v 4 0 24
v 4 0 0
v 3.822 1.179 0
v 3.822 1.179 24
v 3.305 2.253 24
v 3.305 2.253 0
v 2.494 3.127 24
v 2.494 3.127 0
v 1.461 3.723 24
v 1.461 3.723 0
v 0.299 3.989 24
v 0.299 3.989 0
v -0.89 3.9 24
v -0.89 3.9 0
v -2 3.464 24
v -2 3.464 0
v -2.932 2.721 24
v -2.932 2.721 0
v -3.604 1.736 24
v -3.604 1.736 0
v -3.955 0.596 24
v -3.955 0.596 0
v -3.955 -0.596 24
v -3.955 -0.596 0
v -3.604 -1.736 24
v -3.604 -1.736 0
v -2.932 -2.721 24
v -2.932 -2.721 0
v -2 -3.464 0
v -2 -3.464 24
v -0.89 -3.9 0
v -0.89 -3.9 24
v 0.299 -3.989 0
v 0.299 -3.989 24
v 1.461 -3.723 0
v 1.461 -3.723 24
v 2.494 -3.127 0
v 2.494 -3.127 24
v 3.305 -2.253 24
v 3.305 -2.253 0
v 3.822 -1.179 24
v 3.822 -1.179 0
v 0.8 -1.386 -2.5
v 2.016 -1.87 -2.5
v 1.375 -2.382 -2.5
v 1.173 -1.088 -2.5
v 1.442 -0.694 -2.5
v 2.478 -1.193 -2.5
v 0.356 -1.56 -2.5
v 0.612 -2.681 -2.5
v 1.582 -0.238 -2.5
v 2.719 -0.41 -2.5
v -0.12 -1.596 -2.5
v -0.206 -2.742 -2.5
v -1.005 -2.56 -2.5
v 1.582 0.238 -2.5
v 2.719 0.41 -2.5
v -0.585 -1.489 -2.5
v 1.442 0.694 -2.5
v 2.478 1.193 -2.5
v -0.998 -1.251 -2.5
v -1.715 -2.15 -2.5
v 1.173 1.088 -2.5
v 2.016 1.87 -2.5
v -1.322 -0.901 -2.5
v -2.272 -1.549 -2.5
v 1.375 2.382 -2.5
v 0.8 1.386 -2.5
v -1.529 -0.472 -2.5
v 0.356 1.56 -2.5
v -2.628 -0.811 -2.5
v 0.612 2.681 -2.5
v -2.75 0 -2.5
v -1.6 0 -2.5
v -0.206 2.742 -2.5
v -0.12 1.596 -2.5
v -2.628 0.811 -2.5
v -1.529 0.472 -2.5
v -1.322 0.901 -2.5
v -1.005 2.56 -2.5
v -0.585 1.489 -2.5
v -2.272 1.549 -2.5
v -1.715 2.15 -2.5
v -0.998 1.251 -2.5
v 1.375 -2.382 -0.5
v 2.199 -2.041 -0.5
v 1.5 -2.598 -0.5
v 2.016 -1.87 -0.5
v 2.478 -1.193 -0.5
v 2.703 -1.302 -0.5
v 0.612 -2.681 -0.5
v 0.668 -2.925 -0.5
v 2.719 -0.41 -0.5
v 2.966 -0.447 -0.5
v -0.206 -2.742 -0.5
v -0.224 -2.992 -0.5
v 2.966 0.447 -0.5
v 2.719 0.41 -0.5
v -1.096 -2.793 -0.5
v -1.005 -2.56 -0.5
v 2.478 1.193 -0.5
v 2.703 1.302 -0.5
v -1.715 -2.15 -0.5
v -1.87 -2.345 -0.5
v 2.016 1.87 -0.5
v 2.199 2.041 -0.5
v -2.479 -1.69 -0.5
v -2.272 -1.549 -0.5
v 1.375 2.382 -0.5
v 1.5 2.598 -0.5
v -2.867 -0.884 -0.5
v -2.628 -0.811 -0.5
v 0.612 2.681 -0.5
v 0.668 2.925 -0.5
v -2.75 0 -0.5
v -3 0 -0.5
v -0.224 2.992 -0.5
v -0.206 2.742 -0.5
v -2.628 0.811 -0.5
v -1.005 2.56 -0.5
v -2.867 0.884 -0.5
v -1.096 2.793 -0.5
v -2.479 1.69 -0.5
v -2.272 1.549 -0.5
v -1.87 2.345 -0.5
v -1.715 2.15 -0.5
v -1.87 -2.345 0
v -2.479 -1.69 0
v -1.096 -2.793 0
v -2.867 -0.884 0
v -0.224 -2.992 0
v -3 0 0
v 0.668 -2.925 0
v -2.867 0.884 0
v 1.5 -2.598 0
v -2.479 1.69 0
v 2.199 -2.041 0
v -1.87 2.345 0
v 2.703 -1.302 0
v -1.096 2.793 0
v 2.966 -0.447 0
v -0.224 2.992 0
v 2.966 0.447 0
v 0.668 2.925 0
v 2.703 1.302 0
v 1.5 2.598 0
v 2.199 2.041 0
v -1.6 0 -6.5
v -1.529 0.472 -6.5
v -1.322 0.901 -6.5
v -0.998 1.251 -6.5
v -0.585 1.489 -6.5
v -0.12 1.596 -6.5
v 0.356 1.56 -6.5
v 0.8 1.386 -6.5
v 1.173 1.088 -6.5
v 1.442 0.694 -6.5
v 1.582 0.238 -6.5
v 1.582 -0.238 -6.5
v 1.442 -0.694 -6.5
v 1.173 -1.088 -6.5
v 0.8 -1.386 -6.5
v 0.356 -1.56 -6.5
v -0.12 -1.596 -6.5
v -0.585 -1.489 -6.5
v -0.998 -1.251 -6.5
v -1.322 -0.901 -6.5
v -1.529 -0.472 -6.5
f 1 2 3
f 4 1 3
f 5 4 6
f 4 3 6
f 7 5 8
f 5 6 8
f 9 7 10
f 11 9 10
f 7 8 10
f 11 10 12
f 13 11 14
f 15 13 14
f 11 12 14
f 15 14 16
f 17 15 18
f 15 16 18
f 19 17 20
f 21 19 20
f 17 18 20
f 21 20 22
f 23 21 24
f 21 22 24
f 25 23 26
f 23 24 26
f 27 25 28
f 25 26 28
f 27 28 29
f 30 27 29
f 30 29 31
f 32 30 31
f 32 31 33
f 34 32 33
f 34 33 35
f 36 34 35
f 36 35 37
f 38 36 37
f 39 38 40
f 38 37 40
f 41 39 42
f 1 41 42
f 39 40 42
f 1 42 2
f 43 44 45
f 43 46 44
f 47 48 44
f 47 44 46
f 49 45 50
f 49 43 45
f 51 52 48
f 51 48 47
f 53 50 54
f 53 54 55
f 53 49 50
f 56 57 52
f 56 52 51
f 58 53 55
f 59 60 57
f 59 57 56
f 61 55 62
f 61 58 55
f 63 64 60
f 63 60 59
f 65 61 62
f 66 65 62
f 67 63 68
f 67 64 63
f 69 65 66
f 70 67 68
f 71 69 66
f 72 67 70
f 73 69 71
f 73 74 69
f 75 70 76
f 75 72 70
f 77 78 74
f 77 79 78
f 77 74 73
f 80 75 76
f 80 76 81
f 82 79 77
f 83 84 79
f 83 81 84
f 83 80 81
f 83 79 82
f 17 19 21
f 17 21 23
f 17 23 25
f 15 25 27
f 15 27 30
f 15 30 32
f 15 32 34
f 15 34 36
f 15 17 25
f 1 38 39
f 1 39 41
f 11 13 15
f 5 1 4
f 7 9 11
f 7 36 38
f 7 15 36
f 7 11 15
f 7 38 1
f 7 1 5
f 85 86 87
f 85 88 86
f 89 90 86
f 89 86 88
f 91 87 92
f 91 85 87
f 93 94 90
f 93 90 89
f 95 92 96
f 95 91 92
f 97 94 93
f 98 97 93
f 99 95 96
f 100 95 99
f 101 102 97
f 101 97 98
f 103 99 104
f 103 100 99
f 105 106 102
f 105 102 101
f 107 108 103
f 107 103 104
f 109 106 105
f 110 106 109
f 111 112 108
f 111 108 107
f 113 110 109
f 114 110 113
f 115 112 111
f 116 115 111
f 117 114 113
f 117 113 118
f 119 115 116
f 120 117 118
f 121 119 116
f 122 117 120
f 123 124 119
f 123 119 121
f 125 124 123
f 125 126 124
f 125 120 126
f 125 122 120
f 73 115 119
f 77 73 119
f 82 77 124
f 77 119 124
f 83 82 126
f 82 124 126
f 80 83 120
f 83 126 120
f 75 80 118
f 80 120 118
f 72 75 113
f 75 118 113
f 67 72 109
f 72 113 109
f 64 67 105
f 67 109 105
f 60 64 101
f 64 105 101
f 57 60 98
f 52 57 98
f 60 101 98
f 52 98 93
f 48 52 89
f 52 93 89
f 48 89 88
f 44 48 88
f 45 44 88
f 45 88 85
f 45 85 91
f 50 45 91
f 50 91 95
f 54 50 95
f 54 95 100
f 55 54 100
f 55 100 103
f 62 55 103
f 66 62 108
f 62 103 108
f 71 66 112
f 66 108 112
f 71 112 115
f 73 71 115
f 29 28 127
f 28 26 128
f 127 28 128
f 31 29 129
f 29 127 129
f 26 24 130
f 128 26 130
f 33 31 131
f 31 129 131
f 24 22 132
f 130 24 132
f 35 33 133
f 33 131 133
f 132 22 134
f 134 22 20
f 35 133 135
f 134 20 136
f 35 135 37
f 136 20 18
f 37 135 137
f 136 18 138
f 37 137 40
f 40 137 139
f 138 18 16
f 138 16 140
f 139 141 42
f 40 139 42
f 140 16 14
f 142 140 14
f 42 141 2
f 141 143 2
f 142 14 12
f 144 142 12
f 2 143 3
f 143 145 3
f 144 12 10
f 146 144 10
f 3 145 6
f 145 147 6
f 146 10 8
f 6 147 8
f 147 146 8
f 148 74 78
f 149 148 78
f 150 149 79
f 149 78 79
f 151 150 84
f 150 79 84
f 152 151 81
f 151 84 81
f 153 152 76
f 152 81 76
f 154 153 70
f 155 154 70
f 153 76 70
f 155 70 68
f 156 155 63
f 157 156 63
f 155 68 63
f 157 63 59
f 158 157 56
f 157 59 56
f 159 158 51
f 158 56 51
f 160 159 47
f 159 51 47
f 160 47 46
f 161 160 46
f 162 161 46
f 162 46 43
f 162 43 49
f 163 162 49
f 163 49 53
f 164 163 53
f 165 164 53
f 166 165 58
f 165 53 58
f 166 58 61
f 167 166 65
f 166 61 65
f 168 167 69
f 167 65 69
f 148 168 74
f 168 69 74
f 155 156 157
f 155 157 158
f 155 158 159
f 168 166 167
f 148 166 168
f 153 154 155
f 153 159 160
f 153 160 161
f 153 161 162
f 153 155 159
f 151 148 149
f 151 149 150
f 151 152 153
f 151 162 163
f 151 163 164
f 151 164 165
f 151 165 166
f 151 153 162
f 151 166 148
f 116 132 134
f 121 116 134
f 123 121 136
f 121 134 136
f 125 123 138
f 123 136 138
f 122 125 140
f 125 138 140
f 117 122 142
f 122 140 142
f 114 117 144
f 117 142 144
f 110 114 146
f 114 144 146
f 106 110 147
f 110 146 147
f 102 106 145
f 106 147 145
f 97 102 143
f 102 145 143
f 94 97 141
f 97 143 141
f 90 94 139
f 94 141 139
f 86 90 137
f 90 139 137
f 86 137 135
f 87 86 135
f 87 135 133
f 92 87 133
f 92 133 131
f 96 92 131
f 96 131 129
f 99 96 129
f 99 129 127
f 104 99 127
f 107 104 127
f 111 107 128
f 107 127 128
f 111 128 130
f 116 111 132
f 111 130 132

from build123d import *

# Parameters (mm, degrees)
BODYSKE_R    = 4
BODY_DEPTH   = 24
PADSKE_R     = 3
PAD_DEPTH    = 0.5
THREADSKE_R  = 2.75
THREAD_DEPTH = 2
AXISSKE_R    = 1.6
AXIS_DEPTH   = 4


with BuildPart() as part:
    # BodySke → Body (new body)
    with BuildSketch(Plane.XY):
        Circle(BODYSKE_R)
    extrude(amount=BODY_DEPTH)

    # PadSke → Pad (add)
    with BuildSketch(Plane(origin=(0, 0, 0), x_dir=(-1, 0, 0), z_dir=(0, 0, -1))):
        Circle(PADSKE_R)
    extrude(amount=PAD_DEPTH)

    # ThreadSke → Thread (add)
    with BuildSketch(Plane(origin=(0, 0, -0.5), x_dir=(-1, 0, 0), z_dir=(0, 0, -1))):
        Circle(THREADSKE_R)
    extrude(amount=THREAD_DEPTH)

    # AxisSke → Axis (add)
    with BuildSketch(Plane(origin=(0, 0, -2.5), x_dir=(-1, 0, 0), z_dir=(0, 0, -1))):
        Circle(AXISSKE_R)
    extrude(amount=AXIS_DEPTH)


solid = part.part
